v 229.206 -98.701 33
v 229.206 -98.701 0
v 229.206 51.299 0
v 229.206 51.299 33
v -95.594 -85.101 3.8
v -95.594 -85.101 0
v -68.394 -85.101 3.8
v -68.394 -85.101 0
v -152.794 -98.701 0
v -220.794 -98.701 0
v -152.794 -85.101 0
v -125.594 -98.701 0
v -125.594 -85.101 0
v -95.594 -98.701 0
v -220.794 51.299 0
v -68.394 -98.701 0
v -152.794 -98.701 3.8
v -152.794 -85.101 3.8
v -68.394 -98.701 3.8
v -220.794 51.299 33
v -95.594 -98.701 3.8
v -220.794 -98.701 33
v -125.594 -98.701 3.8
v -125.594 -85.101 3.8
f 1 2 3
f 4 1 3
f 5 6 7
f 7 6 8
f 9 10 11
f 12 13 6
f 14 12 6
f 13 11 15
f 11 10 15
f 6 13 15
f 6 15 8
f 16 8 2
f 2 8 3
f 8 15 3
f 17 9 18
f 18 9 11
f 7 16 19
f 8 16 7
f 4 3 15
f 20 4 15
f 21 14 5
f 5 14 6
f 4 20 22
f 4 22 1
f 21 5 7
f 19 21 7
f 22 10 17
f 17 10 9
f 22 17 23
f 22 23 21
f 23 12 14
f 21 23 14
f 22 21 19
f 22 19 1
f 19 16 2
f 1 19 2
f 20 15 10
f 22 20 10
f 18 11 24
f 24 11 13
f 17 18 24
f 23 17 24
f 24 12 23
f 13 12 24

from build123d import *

# Parameters (mm, degrees)
F0_W     = 27.2
F0_H     = 13.6
F1_DEPTH = 3.8
F2_DEPTH = 33


with BuildPart() as f1:
    # F0 (on Top) → F1 (new body)
    with BuildSketch(Plane.XY):
        with Locations((-139.193566, -91.901369)):
            Rectangle(F0_W, F0_H)
        with Locations((-81.993566, -91.901369)):
            Rectangle(F0_W, F0_H)
    extrude(amount=F1_DEPTH)


with BuildPart() as f2:
    # F0 (on Top) → F2 (new body)
    with BuildSketch(Plane.XY):
        Polygon((229.206434, 51.298631), (-220.793566, 51.298631), (-220.793566, -98.701369), (-152.793566, -98.701369), (-152.793566, -85.101369), (-125.593566, -85.101369), (-125.593566, -98.701369), (-95.593566, -98.701369), (-95.593566, -85.101369), (-68.393566, -85.101369), (-68.393566, -98.701369), (229.206434, -98.701369), align=None)
        with Locations((-139.193566, -91.901369)):
            Rectangle(F0_W, F0_H)
        with Locations((-81.993566, -91.901369)):
            Rectangle(F0_W, F0_H)
    extrude(amount=F2_DEPTH)

    # F3: cut F1
    add(f1.part, mode=Mode.SUBTRACT)


solid = f2.part
